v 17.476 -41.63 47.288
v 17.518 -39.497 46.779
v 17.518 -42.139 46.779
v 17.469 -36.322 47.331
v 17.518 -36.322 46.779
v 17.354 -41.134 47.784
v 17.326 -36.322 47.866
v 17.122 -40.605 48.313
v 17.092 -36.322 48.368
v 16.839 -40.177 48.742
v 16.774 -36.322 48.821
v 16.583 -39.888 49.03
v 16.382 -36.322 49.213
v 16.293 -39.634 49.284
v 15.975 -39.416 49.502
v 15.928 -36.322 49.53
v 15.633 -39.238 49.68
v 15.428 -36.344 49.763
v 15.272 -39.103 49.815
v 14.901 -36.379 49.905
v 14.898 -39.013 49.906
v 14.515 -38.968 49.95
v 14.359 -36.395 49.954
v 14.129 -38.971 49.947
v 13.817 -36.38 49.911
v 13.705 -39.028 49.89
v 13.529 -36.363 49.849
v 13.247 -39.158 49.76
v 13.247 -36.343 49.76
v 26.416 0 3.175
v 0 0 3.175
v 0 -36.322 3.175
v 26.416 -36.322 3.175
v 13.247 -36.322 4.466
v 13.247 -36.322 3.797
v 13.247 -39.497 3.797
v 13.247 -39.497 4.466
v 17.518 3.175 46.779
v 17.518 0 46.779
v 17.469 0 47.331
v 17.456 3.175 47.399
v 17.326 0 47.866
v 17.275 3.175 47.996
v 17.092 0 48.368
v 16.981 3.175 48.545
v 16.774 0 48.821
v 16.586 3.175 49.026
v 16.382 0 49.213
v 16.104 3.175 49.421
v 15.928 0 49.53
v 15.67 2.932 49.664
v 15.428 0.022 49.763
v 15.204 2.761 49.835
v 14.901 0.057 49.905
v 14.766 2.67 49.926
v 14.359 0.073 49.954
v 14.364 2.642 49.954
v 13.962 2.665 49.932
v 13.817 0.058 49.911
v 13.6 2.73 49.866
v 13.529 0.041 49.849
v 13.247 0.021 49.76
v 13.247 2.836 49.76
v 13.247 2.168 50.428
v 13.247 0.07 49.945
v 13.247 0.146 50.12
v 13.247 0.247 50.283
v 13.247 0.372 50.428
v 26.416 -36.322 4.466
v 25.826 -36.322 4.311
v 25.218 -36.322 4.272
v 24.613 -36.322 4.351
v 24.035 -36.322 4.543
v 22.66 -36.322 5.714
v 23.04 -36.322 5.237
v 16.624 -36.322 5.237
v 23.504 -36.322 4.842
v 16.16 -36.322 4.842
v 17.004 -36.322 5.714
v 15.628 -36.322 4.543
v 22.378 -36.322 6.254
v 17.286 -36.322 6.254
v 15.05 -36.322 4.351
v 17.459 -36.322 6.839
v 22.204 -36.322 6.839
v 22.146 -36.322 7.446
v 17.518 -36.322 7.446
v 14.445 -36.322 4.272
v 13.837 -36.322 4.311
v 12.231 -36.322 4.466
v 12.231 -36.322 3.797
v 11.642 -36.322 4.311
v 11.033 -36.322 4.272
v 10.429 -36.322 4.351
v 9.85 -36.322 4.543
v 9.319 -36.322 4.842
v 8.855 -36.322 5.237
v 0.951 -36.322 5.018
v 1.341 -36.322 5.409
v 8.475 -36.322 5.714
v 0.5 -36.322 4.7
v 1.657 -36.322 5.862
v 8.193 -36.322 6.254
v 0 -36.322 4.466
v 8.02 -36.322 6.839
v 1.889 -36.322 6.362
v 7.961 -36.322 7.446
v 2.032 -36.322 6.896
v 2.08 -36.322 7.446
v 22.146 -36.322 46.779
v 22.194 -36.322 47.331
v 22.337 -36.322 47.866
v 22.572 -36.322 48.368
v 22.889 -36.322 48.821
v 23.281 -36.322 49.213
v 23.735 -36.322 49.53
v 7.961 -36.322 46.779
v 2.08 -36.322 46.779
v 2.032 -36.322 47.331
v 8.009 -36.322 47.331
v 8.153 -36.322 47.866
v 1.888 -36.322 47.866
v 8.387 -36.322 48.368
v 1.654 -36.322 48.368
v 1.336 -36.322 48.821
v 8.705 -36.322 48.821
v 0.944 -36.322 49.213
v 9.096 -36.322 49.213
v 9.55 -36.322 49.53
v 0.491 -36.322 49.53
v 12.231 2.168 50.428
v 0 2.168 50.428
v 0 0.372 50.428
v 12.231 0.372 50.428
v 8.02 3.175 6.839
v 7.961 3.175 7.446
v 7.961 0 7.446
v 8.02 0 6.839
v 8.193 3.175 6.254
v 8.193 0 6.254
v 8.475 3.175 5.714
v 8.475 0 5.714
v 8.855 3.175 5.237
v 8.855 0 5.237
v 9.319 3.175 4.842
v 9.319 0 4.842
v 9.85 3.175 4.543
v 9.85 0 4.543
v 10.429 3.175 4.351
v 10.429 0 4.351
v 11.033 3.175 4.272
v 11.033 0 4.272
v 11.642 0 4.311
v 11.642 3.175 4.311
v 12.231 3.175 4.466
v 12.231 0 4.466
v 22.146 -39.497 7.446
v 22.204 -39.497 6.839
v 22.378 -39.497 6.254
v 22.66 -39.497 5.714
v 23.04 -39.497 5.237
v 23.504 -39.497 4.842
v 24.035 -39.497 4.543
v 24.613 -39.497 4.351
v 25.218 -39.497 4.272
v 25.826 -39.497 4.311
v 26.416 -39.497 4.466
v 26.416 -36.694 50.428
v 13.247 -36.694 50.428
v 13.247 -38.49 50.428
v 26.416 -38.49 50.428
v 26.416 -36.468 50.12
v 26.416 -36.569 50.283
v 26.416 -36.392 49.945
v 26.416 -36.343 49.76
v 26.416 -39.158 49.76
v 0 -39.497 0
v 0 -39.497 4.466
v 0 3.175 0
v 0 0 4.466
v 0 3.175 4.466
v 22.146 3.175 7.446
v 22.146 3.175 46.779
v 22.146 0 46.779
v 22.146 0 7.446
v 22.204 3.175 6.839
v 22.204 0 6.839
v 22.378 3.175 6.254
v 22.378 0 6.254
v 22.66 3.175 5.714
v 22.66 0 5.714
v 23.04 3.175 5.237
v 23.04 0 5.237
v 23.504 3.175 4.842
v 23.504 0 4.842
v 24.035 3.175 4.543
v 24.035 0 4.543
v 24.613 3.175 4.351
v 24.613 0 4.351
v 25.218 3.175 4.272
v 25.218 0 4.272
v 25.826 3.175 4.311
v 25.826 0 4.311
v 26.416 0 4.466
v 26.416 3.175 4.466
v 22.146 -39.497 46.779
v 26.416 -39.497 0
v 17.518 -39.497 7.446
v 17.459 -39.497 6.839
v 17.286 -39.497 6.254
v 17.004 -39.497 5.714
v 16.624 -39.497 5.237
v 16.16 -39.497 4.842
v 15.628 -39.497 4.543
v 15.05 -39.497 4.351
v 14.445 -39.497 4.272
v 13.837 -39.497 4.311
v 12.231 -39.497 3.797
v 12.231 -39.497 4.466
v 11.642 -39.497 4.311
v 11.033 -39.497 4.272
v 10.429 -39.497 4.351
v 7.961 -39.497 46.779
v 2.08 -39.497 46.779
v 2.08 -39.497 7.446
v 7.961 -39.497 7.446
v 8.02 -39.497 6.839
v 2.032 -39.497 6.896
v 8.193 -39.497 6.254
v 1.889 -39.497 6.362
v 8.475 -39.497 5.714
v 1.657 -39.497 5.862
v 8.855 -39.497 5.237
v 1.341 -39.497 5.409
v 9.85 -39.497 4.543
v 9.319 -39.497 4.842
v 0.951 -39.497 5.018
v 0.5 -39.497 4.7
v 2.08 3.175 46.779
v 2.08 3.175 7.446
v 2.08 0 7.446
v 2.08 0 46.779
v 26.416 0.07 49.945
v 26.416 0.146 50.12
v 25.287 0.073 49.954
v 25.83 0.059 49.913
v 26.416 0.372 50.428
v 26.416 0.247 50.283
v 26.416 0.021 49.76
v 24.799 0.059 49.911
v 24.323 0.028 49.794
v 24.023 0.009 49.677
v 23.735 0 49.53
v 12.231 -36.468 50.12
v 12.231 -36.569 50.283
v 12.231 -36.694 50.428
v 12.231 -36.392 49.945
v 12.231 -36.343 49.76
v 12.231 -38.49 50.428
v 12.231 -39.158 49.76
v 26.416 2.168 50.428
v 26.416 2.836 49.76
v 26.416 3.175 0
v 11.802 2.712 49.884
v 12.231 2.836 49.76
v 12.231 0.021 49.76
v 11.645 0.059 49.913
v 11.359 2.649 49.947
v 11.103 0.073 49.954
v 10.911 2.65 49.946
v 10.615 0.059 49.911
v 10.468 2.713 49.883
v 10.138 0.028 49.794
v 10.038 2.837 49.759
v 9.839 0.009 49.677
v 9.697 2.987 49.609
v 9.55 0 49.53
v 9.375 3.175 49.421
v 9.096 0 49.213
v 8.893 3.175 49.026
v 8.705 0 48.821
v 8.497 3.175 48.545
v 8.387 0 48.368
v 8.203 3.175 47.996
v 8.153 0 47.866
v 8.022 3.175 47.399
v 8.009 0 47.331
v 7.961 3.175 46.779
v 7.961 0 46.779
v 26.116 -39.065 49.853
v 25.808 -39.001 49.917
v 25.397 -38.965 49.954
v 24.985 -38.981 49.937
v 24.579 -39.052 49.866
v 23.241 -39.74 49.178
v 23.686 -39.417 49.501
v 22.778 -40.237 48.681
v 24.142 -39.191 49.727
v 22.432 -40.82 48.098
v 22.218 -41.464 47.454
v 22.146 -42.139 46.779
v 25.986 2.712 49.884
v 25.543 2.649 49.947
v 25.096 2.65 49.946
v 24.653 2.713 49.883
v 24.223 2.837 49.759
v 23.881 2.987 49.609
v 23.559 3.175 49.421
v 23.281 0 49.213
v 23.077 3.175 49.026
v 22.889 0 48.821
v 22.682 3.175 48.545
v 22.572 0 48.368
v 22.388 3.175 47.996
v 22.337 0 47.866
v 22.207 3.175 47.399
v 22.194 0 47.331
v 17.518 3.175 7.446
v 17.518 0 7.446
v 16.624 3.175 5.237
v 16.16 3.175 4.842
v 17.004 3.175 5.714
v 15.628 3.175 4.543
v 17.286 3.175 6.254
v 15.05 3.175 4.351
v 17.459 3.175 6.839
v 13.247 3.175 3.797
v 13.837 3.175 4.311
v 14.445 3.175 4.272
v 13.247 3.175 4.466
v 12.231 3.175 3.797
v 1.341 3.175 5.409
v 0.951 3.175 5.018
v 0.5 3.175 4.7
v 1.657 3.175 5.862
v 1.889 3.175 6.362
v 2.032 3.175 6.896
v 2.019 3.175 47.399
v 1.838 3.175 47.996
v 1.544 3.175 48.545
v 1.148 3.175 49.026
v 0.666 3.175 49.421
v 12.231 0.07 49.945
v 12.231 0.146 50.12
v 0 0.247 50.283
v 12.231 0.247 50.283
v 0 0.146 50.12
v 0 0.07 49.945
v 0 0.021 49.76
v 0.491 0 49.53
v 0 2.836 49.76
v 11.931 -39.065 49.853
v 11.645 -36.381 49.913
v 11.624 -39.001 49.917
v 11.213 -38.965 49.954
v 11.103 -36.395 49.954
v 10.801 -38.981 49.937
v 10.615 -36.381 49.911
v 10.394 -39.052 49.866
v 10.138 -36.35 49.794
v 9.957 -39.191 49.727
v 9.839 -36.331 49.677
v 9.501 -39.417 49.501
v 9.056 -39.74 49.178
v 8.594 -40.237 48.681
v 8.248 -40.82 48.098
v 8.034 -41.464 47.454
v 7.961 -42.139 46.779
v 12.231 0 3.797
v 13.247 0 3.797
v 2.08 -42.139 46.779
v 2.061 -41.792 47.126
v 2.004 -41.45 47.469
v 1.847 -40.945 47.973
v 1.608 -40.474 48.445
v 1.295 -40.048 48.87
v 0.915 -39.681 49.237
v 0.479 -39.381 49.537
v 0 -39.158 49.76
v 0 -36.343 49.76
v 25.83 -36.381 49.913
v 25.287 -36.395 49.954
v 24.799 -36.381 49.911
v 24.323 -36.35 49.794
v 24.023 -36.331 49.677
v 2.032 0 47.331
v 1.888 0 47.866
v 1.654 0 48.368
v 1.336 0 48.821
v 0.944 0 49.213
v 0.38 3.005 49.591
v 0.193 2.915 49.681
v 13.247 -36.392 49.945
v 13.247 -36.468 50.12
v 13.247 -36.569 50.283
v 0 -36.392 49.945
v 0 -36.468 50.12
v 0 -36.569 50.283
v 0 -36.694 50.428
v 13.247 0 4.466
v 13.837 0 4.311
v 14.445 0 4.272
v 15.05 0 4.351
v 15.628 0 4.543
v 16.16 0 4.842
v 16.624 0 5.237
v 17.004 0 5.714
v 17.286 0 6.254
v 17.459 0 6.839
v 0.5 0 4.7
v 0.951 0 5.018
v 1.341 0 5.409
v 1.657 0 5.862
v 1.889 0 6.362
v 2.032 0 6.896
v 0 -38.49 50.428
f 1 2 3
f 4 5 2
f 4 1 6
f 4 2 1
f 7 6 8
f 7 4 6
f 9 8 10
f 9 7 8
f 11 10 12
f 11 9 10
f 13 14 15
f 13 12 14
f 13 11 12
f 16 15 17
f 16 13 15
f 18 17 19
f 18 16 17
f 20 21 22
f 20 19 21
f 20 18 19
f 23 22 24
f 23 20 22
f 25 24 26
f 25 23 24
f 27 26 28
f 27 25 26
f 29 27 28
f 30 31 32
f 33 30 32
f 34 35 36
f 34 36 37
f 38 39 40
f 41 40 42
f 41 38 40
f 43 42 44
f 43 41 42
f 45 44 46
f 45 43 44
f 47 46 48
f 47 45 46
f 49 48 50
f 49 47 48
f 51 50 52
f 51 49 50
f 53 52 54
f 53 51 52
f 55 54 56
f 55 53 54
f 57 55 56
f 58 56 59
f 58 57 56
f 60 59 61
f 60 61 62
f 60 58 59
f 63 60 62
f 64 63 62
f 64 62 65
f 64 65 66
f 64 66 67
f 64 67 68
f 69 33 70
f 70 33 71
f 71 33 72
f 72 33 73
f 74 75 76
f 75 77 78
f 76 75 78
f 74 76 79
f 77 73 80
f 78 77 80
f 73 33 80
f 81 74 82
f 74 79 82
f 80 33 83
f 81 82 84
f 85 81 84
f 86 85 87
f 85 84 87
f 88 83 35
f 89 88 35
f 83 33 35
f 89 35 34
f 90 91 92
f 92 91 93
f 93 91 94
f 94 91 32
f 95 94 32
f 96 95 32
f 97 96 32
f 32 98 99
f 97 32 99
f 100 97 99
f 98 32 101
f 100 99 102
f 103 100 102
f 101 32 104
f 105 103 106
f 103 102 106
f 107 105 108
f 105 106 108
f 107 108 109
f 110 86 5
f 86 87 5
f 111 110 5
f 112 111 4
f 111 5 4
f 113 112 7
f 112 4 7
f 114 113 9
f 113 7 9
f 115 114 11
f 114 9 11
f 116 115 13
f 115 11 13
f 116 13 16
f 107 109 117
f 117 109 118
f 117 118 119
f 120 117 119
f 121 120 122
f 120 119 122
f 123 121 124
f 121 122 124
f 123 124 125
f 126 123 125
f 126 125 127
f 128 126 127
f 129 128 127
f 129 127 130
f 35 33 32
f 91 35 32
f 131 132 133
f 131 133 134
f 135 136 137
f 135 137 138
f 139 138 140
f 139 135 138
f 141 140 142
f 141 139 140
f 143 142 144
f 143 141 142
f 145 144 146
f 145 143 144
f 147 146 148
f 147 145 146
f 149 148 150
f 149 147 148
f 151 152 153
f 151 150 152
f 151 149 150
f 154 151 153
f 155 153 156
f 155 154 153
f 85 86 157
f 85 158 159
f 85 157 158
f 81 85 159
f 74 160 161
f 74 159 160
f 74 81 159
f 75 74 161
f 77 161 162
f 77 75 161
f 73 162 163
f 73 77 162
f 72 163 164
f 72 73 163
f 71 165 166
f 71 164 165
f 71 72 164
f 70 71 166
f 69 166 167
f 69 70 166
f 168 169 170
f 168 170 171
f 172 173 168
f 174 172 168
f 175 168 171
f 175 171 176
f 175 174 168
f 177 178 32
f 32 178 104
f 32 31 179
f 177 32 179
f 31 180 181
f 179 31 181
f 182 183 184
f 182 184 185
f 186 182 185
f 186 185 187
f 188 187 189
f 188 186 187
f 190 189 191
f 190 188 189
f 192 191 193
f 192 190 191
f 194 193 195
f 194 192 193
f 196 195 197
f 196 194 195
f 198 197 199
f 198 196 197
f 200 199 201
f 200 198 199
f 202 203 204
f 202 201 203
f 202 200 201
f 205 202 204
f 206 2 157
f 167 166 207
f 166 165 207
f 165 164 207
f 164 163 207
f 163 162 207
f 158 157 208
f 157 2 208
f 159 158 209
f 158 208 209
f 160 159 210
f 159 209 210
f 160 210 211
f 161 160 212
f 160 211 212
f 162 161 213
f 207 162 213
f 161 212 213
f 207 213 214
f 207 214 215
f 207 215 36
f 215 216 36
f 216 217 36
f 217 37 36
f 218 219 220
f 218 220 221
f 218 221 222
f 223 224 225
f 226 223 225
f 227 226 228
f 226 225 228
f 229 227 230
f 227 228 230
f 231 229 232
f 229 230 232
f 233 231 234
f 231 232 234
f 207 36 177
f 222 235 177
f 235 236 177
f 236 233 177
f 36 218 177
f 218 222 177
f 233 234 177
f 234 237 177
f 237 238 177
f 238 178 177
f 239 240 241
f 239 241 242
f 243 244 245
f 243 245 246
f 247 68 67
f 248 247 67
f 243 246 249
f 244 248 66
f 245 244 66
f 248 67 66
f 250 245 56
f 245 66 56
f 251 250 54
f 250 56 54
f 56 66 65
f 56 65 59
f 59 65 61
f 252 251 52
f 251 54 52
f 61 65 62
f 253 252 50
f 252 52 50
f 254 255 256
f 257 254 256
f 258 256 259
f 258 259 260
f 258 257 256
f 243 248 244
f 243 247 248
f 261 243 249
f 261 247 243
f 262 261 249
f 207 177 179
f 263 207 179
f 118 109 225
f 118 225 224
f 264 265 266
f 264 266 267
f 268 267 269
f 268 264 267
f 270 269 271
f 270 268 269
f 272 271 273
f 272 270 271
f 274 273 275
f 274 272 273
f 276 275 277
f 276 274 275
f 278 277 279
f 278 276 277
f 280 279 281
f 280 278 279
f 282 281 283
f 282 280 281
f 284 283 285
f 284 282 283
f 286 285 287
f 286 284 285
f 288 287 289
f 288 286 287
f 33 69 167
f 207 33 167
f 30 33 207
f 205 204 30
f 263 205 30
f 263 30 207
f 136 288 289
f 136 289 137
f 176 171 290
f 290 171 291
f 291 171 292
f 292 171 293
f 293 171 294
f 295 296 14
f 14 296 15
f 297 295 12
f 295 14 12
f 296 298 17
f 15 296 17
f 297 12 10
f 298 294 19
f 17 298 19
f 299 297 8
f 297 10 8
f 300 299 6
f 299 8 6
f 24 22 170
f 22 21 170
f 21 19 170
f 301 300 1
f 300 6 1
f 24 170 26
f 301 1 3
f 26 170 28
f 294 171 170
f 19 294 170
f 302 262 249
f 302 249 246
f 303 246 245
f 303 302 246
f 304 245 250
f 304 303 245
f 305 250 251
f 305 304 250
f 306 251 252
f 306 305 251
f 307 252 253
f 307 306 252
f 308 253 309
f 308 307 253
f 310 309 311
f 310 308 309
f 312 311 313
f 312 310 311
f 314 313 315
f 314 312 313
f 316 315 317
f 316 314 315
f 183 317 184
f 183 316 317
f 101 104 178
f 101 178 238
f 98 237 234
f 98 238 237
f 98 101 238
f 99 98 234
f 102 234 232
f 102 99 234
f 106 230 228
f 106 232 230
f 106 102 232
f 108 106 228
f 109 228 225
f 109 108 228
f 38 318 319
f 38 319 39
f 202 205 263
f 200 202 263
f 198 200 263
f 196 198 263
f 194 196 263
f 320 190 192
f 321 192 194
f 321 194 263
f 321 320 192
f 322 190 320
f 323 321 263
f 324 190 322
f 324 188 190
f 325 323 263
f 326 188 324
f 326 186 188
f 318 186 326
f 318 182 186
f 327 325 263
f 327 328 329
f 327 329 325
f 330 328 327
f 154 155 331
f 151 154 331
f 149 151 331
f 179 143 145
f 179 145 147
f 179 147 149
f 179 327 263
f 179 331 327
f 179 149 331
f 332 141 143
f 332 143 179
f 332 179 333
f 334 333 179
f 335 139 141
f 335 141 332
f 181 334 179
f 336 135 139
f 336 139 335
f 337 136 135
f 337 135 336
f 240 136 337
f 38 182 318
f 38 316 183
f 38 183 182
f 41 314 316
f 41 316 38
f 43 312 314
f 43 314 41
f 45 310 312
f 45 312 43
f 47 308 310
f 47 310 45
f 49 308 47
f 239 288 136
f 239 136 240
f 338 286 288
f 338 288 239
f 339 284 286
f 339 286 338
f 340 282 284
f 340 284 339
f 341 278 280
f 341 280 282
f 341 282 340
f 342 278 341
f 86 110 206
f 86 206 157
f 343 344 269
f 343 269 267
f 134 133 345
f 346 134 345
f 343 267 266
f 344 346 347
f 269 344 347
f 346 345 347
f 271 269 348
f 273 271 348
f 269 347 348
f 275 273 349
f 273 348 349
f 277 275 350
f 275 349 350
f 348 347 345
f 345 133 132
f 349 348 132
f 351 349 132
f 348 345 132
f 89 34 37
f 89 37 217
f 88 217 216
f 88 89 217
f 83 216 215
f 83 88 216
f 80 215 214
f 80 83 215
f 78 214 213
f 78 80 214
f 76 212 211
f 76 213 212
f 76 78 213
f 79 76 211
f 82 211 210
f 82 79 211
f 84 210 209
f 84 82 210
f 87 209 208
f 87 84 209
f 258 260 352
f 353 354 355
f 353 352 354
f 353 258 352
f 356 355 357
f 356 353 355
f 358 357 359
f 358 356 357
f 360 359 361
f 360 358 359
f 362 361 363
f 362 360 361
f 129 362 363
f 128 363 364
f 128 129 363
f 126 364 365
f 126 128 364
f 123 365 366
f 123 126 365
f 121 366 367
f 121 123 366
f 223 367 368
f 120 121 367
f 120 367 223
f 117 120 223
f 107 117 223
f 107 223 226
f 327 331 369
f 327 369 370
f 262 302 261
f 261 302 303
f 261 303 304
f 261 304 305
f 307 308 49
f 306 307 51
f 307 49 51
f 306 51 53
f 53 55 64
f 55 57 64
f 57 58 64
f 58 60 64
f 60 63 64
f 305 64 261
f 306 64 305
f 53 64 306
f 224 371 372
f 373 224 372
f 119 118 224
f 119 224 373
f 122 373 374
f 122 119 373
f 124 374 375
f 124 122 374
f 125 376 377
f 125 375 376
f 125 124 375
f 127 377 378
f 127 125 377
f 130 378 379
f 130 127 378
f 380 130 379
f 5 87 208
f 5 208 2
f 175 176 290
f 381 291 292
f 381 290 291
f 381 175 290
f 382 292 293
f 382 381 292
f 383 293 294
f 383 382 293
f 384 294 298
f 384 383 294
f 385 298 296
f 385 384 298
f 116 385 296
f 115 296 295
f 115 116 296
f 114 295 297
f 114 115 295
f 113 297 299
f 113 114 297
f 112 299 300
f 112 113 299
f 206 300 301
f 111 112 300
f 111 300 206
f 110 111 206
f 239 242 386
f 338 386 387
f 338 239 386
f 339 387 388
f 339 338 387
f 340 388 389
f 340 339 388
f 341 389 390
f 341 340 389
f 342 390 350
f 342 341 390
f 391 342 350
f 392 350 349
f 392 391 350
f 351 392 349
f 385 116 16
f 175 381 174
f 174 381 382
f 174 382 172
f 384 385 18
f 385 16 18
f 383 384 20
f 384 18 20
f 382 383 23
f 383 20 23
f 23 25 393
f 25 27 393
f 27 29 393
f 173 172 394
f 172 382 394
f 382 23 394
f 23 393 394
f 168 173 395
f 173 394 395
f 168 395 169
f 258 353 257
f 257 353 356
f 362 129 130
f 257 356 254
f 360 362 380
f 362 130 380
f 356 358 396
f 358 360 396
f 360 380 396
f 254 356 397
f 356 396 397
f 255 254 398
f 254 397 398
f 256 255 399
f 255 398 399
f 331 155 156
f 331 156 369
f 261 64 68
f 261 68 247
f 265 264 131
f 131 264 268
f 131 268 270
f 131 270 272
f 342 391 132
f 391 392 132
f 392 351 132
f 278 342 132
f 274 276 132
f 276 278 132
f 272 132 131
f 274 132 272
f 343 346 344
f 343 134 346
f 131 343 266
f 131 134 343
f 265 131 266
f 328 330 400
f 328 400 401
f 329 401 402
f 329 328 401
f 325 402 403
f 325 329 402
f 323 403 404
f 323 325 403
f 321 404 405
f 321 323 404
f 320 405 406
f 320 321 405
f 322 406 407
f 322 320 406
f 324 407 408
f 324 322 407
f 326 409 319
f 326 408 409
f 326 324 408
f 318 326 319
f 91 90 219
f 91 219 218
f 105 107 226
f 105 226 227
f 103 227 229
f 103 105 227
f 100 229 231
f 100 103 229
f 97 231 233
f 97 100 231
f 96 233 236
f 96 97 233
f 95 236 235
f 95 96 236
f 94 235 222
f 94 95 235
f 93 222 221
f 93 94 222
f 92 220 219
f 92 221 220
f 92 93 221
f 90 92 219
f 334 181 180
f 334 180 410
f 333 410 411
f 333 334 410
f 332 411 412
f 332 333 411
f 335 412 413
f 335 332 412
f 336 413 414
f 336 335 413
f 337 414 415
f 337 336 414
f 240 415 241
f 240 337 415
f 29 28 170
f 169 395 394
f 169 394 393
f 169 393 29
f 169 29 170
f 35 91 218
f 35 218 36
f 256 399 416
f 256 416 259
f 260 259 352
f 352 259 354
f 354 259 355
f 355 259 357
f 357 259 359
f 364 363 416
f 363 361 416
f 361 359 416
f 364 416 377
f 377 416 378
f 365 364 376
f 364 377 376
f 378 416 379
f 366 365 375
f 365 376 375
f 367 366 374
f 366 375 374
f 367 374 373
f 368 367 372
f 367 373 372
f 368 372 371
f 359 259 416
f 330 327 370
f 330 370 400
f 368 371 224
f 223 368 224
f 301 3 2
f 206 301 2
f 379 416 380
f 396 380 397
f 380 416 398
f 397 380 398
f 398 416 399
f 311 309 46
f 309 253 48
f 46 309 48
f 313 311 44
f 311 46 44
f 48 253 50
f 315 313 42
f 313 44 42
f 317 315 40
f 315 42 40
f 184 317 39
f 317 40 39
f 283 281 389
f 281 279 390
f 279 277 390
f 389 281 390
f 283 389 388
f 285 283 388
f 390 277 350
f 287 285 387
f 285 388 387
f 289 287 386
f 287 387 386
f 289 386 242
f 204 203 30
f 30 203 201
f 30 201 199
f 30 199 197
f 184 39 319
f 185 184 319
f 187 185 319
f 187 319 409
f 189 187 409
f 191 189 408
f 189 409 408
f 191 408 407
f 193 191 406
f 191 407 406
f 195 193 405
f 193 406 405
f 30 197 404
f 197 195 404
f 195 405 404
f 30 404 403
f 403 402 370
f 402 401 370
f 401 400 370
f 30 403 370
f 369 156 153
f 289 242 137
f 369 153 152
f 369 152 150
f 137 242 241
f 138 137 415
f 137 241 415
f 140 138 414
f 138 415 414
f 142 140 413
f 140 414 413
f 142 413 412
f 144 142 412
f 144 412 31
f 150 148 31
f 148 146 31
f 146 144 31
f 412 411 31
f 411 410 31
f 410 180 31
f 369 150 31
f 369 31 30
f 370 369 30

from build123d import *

# Parameters (mm, degrees)
F1_DEPTH = 191.008
F3_DEPTH = 45.3146


with BuildPart() as f1:
    # F0 (on Right) → F1 (new body)
    with BuildSketch(Plane.YZ):
        with BuildLine():
            ThreePointArc((2.168026, 50.428026), (0.783992, 50.703327), (0, 49.53))
            Line((0, 49.53), (2.168026, 50.428026))
        make_face()
        Polygon((2.168026, 50.428026), (0, 49.53), (0, 3.175), (-18.161, 3.175), (-18.161, 0), (3.175, 0), (3.175, 46.779451), (5.8166, 46.779451), align=None)
        Polygon((-18.161, 0), (-18.161, 3.175), (-36.322, 3.175), (-36.322, 49.53), (-38.490026, 50.428026), (-42.1386, 46.779451), (-39.497, 46.779451), (-39.497, 0), align=None)
        with BuildLine():
            Line((-38.490026, 50.428026), (-36.322, 49.53))
            ThreePointArc((-36.322, 49.53), (-37.105992, 50.703327), (-38.490026, 50.428026))
        make_face()
    extrude(amount=F1_DEPTH)

    # F2 (on face) → F3 (intersect, through all)
    with BuildSketch(Plane(origin=(0, 3.175, 0), x_dir=(-1, 0, 0), z_dir=(0, 1, 0))):
        with BuildLine():
            Line((-26.416, 0), (0, 0))
            Line((0, 0), (0, 4.465561))
            ThreePointArc((0, 4.465561), (-1.508444, 5.628635), (-2.079805, 7.44569))
            Line((-2.079805, 7.44569), (-2.079805, 46.779451))
            ThreePointArc((-2.079805, 46.779451), (-1.508444, 48.596507), (0, 49.759581))
            Line((0, 49.759581), (0, 50.428026))
            Line((0, 50.428026), (-12.231331, 50.428026))
            Line((-12.231331, 50.428026), (-12.231331, 49.759581))
            ThreePointArc((-12.231331, 49.759581), (-9.31908, 49.38309), (-7.961135, 46.779451))
            Line((-7.961135, 46.779451), (-7.961135, 7.44569))
            ThreePointArc((-7.961135, 7.44569), (-9.31908, 4.842052), (-12.231331, 4.465561))
            Line((-12.231331, 4.465561), (-12.231331, 3.797116))
            Line((-12.231331, 3.797116), (-13.247331, 3.797116))
            Line((-13.247331, 3.797116), (-13.247331, 4.465561))
            ThreePointArc((-13.247331, 4.465561), (-16.159581, 4.842052), (-17.517526, 7.44569))
            Line((-17.517526, 7.44569), (-17.517526, 46.779451))
            ThreePointArc((-17.517526, 46.779451), (-16.159581, 49.38309), (-13.247331, 49.759581))
            Line((-13.247331, 49.759581), (-13.247331, 50.428026))
            Line((-13.247331, 50.428026), (-26.416, 50.428026))
            Line((-26.416, 50.428026), (-26.416, 49.759581))
            ThreePointArc((-26.416, 49.759581), (-23.503749, 49.38309), (-22.145805, 46.779451))
            Line((-22.145805, 46.779451), (-22.145805, 7.44569))
            ThreePointArc((-22.145805, 7.44569), (-23.503749, 4.842052), (-26.416, 4.465561))
            Line((-26.416, 4.465561), (-26.416, 0))
        make_face()
    extrude(amount=-F3_DEPTH, mode=Mode.INTERSECT)


solid = f1.part
